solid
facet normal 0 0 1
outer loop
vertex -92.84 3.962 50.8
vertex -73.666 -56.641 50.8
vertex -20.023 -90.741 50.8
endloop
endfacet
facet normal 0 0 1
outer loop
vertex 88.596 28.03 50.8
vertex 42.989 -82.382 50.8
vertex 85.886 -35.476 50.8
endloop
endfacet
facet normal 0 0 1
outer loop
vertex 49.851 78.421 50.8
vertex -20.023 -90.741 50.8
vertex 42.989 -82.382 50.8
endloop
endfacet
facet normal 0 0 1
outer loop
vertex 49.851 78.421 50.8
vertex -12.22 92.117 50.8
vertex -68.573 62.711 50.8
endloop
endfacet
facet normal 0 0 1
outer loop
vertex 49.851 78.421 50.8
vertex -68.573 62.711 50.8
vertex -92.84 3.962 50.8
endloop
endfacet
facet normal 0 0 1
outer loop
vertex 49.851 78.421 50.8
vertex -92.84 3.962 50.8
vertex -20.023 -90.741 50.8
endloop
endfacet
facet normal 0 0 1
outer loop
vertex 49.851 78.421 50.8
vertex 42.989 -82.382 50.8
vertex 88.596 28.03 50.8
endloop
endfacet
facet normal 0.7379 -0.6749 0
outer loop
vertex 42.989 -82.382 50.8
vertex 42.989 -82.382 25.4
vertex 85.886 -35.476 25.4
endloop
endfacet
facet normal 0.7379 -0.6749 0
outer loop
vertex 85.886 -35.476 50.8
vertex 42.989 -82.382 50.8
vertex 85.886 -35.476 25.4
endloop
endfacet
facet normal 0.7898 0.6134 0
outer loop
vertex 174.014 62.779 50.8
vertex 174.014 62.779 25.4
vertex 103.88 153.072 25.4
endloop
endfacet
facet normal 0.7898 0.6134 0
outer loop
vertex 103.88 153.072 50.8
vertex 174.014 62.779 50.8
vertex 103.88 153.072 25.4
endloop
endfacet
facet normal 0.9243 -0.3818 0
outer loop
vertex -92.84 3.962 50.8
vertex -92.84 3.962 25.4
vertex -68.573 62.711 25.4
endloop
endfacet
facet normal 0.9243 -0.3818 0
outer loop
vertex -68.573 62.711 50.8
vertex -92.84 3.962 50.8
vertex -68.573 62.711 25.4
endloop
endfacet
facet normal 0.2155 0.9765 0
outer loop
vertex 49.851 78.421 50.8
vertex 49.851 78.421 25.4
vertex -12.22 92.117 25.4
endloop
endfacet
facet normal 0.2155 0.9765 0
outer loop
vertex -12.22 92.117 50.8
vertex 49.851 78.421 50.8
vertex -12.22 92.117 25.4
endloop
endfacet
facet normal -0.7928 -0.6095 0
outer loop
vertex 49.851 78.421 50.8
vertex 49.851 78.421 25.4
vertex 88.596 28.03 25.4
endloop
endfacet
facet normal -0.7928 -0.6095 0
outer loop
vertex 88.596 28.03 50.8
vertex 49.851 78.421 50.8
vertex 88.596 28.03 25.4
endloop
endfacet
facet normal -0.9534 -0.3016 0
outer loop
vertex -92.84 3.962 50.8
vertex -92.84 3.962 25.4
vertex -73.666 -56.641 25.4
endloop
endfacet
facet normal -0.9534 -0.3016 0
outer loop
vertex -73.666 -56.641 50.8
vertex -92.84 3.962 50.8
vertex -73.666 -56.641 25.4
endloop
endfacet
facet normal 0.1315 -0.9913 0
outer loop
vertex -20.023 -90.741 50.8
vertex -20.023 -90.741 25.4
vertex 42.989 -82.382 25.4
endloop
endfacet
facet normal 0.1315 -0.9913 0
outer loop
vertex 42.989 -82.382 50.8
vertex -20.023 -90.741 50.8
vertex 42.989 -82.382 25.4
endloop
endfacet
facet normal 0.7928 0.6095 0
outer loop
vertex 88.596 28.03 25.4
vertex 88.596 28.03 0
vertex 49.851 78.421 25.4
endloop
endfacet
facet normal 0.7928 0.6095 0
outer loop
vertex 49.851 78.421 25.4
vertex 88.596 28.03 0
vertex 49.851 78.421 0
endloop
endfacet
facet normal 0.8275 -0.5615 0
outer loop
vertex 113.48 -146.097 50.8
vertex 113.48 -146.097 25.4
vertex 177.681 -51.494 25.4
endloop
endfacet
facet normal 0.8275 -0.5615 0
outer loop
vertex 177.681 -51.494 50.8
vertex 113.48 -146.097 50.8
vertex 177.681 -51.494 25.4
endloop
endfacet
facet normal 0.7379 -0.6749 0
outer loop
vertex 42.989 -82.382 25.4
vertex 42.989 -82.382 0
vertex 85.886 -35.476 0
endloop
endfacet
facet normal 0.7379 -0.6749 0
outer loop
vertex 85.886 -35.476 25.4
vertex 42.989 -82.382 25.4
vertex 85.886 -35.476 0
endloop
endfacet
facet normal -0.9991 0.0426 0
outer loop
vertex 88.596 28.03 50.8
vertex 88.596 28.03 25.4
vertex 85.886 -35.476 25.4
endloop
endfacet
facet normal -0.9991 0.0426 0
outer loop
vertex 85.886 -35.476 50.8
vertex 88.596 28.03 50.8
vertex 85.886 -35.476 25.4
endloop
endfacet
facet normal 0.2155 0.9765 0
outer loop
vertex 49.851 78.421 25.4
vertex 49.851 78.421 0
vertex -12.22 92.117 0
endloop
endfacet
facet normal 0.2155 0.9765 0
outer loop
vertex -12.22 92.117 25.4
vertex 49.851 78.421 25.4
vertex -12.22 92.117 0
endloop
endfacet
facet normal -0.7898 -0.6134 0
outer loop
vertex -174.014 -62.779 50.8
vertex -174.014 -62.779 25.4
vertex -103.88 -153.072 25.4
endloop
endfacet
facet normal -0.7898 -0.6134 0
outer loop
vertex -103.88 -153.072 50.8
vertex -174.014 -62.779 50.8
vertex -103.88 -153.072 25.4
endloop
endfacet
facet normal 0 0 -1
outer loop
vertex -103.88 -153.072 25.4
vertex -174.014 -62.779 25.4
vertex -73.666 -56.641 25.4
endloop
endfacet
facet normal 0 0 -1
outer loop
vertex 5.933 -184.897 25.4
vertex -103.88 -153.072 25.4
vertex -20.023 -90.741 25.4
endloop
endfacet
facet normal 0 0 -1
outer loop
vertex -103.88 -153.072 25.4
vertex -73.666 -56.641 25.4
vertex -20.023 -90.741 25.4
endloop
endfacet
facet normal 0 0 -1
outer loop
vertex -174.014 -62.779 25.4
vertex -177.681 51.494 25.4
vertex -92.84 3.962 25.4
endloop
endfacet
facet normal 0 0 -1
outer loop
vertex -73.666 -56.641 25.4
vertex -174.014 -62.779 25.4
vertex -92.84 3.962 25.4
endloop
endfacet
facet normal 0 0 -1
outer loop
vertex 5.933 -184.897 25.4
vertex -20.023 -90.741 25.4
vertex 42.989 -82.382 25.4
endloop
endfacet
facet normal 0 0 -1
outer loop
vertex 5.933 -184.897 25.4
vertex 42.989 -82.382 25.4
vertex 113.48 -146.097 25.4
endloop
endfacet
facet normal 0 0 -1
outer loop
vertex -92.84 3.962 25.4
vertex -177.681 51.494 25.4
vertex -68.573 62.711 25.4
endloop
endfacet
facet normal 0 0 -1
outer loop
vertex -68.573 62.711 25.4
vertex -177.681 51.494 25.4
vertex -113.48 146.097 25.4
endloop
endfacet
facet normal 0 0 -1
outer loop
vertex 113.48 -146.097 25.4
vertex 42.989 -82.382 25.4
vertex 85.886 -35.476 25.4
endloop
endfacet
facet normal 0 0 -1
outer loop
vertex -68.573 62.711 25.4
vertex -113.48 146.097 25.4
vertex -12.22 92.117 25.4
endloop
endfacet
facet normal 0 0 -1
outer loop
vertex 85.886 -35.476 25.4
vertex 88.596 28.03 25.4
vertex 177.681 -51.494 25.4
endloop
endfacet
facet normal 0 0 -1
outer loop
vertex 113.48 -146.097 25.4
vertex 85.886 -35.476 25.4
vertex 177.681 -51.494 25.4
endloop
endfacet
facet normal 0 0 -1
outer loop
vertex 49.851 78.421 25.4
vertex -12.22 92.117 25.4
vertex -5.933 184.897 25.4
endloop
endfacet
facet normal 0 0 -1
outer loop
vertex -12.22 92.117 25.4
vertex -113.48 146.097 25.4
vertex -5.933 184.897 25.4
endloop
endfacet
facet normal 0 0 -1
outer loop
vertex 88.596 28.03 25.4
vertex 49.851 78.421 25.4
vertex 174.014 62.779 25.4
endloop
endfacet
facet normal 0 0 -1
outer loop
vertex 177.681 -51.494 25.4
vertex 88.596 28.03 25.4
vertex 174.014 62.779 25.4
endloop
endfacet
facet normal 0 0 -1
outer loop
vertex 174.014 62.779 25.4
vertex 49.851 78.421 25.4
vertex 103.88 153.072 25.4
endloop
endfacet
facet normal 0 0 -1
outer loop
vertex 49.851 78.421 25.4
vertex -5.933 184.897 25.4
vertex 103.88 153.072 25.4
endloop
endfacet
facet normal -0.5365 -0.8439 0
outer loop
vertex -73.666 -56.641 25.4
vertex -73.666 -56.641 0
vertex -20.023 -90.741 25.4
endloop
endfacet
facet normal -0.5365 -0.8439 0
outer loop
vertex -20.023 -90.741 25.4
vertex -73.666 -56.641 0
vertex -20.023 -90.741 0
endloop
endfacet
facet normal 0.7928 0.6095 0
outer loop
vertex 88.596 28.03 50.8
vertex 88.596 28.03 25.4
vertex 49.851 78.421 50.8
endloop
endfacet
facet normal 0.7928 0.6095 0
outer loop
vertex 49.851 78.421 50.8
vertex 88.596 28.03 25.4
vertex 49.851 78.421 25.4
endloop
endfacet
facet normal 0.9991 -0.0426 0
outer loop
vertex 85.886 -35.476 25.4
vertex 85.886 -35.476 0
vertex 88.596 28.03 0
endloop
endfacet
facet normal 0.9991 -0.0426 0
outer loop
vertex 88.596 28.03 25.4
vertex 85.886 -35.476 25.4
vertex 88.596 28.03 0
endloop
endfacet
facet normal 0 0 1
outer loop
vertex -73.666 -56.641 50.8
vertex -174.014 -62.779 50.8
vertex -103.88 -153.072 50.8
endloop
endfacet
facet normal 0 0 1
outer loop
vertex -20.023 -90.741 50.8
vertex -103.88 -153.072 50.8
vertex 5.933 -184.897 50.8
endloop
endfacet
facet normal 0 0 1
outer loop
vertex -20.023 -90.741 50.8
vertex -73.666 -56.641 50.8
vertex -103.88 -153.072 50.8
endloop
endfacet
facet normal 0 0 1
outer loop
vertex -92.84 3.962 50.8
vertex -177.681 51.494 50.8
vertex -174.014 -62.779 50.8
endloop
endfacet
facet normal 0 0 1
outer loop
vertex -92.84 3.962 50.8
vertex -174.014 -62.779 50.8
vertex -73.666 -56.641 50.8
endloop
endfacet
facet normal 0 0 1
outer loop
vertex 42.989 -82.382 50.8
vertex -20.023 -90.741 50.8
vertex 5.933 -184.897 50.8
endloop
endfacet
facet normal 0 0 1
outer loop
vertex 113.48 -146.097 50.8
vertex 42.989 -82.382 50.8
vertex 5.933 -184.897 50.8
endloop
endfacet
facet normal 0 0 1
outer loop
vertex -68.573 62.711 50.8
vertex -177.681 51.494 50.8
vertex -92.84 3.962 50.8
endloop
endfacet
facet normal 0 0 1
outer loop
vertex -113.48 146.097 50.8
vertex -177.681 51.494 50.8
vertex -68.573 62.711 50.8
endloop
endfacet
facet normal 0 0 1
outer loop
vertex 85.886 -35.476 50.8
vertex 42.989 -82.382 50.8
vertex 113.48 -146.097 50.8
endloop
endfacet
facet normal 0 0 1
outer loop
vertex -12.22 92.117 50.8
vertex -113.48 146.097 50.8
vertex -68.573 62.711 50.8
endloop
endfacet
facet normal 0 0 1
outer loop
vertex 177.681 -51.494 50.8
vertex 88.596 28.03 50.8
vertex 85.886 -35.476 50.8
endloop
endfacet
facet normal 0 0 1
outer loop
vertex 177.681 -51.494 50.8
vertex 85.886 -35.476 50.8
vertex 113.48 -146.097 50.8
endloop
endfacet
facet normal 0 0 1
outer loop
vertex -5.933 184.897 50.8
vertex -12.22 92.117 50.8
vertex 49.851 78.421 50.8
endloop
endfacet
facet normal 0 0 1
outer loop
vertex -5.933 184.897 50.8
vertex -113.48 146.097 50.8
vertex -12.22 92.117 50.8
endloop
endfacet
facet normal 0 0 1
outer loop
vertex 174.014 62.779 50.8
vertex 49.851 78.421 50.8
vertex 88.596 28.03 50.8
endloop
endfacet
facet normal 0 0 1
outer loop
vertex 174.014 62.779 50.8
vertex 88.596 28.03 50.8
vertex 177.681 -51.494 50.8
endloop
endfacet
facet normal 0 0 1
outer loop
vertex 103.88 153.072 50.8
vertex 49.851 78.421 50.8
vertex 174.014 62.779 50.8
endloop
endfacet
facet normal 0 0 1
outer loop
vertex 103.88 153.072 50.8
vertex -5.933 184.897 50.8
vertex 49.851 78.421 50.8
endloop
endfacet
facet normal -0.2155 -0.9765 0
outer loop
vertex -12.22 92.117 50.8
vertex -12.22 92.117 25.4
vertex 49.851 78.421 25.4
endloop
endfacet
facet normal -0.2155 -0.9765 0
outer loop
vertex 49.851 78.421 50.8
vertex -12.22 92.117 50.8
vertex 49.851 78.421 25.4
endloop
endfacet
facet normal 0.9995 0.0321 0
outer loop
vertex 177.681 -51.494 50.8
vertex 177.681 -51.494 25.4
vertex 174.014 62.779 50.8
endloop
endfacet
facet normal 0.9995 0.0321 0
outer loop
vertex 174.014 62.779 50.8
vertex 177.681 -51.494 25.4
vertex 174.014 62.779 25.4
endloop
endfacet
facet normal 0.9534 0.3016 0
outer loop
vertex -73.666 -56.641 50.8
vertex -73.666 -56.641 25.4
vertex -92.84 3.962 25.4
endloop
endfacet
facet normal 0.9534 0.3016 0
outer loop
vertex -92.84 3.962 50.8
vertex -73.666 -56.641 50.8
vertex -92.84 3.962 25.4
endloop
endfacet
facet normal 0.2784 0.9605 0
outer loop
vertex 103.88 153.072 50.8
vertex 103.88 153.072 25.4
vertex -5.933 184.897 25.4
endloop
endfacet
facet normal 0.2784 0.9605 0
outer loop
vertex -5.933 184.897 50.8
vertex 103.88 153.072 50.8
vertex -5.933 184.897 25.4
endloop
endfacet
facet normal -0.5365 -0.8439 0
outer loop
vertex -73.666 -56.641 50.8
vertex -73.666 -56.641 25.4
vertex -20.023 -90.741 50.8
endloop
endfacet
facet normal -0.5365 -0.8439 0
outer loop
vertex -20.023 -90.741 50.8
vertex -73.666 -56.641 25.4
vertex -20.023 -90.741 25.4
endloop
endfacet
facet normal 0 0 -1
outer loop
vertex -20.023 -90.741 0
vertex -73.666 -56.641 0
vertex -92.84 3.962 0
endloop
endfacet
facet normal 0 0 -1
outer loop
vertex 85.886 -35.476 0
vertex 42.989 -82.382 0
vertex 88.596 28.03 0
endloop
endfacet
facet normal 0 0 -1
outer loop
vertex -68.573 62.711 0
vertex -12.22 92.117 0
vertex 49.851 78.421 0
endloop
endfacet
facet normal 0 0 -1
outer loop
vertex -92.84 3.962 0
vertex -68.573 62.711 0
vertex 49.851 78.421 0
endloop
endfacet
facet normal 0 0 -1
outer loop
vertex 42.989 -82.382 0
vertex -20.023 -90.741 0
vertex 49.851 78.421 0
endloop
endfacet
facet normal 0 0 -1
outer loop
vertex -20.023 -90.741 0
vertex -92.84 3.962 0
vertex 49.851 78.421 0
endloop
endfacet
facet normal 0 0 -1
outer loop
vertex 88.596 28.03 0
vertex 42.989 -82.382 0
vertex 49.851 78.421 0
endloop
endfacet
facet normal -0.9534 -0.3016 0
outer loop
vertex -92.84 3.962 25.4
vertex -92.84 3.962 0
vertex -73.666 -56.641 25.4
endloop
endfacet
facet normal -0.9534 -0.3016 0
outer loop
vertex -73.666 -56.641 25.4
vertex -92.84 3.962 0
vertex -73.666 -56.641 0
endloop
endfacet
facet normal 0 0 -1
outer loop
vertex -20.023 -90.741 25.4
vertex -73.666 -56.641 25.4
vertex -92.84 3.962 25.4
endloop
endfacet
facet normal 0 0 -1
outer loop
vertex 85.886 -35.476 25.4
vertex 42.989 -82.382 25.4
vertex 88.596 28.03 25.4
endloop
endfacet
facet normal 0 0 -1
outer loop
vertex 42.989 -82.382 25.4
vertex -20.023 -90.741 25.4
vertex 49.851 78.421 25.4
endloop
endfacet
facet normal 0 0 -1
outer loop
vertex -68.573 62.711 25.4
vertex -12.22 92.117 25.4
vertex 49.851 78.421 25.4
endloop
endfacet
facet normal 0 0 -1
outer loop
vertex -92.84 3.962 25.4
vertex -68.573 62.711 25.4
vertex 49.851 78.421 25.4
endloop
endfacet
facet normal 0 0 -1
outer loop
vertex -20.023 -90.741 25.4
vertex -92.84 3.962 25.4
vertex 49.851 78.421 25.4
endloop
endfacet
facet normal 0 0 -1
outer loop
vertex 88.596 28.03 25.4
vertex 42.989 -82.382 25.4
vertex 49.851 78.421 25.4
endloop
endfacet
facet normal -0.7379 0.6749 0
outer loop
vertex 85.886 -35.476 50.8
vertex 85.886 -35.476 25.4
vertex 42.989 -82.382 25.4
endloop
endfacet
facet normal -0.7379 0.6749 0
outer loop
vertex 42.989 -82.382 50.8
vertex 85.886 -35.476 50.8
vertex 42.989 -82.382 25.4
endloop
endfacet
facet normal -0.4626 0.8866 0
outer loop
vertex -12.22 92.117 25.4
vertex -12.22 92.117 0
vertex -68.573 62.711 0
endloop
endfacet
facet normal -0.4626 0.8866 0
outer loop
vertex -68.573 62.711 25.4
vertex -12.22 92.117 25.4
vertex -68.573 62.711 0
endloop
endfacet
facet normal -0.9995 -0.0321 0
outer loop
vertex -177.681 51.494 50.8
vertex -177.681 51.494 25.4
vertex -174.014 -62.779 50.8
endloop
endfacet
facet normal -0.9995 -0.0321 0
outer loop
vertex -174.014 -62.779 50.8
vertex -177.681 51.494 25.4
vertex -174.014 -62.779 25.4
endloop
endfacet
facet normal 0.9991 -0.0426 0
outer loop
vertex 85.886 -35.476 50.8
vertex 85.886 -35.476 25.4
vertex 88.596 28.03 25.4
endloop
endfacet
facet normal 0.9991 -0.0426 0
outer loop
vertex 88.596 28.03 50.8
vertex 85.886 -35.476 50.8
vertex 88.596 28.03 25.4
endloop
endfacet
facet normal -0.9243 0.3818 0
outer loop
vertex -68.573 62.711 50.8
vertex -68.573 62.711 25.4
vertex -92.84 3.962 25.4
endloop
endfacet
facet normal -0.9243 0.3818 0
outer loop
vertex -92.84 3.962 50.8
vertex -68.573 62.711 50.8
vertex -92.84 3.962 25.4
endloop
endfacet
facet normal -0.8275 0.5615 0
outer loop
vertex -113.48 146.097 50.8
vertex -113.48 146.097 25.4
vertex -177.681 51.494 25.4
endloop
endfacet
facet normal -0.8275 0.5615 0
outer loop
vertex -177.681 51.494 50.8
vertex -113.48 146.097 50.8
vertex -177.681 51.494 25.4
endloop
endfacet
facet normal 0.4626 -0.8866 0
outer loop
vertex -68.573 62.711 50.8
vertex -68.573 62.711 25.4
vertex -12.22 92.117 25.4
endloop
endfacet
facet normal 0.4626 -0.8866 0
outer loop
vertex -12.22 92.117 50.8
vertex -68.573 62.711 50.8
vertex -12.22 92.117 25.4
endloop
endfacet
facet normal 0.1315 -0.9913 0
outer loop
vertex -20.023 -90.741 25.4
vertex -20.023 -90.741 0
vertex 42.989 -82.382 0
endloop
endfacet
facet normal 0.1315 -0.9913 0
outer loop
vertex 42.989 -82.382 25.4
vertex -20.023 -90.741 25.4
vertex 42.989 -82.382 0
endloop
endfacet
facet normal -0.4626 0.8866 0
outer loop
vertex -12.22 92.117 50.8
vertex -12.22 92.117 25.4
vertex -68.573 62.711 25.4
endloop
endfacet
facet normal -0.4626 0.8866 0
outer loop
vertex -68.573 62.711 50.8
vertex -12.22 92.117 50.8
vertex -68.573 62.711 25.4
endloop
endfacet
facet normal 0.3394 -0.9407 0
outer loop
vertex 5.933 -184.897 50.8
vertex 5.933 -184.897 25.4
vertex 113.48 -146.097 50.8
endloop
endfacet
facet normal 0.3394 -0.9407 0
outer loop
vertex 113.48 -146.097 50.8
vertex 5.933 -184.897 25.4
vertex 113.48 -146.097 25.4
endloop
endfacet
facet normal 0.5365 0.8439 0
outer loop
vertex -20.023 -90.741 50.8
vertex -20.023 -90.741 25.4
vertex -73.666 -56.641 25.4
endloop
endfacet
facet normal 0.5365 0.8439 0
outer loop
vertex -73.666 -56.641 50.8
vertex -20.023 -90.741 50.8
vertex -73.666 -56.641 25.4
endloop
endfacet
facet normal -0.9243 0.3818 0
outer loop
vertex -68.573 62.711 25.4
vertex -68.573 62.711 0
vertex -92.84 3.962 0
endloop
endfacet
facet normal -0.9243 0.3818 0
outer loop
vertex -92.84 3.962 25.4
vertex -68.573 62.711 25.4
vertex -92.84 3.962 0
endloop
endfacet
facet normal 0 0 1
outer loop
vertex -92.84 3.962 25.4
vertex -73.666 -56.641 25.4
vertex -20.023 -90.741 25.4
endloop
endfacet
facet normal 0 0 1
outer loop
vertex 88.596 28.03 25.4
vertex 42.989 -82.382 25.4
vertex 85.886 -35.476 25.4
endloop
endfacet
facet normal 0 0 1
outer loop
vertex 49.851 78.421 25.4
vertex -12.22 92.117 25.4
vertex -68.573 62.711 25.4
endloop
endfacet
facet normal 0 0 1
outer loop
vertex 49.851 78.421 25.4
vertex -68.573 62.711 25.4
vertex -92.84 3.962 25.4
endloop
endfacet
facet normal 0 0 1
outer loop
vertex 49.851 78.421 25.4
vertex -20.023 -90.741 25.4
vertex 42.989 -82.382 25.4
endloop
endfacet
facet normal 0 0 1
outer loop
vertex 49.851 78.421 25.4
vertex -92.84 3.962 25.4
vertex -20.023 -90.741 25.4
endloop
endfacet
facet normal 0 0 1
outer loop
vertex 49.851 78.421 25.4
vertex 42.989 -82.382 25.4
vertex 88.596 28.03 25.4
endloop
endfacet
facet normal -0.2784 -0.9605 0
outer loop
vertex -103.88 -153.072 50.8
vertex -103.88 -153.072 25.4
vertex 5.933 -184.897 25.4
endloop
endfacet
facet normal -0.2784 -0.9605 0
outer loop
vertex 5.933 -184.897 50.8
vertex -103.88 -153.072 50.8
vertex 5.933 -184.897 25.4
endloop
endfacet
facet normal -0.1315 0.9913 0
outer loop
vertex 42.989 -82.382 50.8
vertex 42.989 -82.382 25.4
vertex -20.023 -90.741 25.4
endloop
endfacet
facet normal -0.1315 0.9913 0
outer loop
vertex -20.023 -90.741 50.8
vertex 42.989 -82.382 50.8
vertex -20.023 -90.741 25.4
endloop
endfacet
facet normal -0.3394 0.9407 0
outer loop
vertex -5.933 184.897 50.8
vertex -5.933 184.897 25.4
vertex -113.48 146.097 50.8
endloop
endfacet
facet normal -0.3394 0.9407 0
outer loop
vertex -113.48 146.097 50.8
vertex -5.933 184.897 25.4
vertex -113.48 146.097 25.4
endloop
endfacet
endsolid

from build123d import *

# Parameters (mm, degrees)
F1_DEPTH = 25.4
F3_DEPTH = 25.4
F4_DEPTH = 25.4


with BuildPart() as f1:
    # F0 (on Top) → F1 (new body)
    with BuildSketch(Plane.XY):
        Polygon((42.988974, -82.382422), (85.885865, -35.475817), (88.595805, 28.030317), (49.850783, 78.420754), (-12.219974, 92.117249), (-68.572869, 62.711059), (-92.839757, 3.961667), (-73.665891, -56.641432), (-20.022935, -90.741376), align=None)
    extrude(amount=F1_DEPTH)


with BuildPart() as f3:
    # F2 (on face) → F3 (new body)
    with BuildSketch(Plane.XY.offset(25.4)):
        Polygon((113.479517, -146.097221), (177.680649, -51.493548), (174.013813, 62.77891), (103.879614, 153.071958), (-5.933066, 184.896721), (-113.479517, 146.097221), (-177.680649, 51.493548), (-174.013813, -62.77891), (-103.879614, -153.071958), (5.933066, -184.896721), align=None)
        Polygon((42.988974, -82.382422), (-20.022935, -90.741376), (-73.665891, -56.641432), (-92.839757, 3.961667), (-68.572869, 62.711059), (-12.219974, 92.117249), (49.850783, 78.420754), (88.595805, 28.030317), (85.885865, -35.475817), align=None, mode=Mode.SUBTRACT)
    extrude(amount=F3_DEPTH)


with BuildPart() as f4:
    # F1_face (on face) → F4 (new body)
    with BuildSketch(Plane.XY.offset(25.4)):
        Polygon((-20.022935, -90.741376), (42.988974, -82.382422), (85.885865, -35.475817), (88.595805, 28.030317), (49.850783, 78.420754), (-12.219974, 92.117249), (-68.572869, 62.711059), (-92.839757, 3.961667), (-73.665891, -56.641432), align=None)
    extrude(amount=F4_DEPTH)


solid = Compound([f1.part, f3.part, f4.part])
